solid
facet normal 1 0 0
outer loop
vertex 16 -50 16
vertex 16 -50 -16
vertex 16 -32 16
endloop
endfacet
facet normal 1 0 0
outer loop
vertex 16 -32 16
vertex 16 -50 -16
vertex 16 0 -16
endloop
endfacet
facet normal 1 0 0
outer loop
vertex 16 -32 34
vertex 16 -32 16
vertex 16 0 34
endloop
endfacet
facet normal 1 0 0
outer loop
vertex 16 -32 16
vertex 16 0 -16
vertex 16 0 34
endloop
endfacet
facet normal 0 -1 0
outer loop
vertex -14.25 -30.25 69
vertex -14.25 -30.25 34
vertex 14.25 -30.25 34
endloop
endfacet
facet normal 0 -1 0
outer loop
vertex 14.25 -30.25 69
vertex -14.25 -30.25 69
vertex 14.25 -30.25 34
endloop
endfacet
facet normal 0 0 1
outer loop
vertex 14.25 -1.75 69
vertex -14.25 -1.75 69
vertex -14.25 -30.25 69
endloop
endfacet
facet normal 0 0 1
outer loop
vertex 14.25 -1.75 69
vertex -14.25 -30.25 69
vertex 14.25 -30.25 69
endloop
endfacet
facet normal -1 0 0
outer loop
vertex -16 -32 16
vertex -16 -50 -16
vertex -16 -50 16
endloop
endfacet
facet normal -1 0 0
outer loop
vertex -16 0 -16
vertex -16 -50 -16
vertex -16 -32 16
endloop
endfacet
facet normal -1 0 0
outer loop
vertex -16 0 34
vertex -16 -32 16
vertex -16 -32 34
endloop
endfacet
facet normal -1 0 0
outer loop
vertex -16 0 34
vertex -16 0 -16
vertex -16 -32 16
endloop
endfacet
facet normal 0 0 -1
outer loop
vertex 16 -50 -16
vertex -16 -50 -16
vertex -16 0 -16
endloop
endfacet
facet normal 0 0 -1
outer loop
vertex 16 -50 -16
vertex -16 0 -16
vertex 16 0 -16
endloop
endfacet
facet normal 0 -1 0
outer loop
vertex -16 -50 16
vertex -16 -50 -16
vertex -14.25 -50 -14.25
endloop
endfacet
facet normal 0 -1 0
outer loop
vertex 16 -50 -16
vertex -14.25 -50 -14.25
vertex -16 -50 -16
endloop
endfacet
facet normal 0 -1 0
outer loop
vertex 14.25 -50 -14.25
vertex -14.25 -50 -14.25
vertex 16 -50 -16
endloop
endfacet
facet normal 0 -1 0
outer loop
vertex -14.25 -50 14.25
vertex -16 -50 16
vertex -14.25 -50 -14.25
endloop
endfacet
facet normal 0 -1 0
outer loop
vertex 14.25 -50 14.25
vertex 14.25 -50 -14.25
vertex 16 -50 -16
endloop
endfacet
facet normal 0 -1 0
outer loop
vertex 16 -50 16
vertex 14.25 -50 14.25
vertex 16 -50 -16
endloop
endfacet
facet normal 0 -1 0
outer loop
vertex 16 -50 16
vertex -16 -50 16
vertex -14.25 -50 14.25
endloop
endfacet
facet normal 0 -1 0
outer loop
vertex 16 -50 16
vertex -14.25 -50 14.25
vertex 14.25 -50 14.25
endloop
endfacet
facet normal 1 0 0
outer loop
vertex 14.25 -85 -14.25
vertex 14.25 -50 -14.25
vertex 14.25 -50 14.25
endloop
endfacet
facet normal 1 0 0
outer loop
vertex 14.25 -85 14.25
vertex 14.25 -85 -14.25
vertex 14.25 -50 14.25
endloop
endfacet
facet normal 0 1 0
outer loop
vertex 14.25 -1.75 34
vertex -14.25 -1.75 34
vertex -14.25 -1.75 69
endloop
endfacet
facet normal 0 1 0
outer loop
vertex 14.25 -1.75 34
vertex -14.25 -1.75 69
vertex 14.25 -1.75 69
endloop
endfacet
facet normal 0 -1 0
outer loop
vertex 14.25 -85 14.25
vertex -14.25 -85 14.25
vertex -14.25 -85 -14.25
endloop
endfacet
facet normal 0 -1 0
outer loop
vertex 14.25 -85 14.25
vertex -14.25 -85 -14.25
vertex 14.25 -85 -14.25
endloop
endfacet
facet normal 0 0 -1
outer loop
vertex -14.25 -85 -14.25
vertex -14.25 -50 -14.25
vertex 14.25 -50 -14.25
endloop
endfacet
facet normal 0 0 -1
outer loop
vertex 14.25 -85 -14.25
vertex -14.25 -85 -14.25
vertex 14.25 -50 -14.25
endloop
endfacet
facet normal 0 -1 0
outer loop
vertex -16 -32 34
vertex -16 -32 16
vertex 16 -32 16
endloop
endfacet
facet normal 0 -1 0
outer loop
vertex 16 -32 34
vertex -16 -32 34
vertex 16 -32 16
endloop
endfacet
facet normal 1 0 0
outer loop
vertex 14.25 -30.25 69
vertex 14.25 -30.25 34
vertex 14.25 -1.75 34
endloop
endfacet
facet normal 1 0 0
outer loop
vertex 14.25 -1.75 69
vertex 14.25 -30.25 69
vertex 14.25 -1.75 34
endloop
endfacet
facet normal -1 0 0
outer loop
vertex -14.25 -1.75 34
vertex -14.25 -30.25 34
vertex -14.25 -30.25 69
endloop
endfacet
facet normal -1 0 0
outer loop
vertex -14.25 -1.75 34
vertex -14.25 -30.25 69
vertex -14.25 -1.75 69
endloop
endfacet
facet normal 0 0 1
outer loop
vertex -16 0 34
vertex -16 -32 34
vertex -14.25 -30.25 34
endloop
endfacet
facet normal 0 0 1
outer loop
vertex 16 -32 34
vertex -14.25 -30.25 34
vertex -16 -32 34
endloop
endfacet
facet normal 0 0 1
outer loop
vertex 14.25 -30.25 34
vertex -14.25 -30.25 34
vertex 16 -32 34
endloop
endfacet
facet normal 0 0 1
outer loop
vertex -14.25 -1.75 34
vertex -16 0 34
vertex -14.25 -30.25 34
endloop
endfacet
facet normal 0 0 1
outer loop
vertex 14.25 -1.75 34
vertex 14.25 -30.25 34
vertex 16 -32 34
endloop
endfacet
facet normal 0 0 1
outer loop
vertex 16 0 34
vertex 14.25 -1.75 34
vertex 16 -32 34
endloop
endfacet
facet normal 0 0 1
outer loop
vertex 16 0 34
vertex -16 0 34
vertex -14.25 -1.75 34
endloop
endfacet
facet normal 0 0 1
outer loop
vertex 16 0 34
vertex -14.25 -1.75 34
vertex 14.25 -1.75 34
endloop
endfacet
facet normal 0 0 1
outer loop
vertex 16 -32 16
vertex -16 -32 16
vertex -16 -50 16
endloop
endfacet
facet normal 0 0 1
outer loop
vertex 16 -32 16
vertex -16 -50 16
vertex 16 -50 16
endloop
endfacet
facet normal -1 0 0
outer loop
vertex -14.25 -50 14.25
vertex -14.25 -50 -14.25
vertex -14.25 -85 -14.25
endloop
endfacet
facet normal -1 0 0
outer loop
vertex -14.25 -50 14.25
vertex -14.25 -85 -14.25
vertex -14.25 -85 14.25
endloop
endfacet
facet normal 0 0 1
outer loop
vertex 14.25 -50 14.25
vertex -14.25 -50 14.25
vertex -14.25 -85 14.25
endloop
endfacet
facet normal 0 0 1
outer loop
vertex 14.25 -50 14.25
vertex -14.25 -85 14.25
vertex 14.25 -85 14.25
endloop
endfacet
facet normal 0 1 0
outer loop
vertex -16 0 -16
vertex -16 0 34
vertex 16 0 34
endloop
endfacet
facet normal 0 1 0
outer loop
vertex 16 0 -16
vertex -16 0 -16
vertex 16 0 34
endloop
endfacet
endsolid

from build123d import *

# Parameters (mm, degrees)
F0_W     = 32
F0_H     = 32
F1_DEPTH = 32
F2_W     = 32
F2_H     = 32
F3_DEPTH = 18
F4_W     = 32
F4_H     = 32
F5_DEPTH = 18
F6_W     = 28.5
F6_H     = 28.5
F7_DEPTH = 35
F8_W     = 28.5
F8_H     = 28.5
F9_DEPTH = 35


with BuildPart() as f1:
    # F0 (on Front) → F1 (new body)
    with BuildSketch(Plane.XZ):
        Rectangle(F0_W, F0_H)
    extrude(amount=F1_DEPTH)

    # F2 (on face) → F3 (join)
    with BuildSketch(Plane.XY.offset(16)):
        with Locations((0, -16)):
            Rectangle(F2_W, F2_H)
    extrude(amount=F3_DEPTH)

    # F4 (on face) → F5 (join)
    with BuildSketch(Plane.XZ.offset(32)):
        Rectangle(F4_W, F4_H)
    extrude(amount=F5_DEPTH)

    # F6 (on face) → F7 (join)
    with BuildSketch(Plane.XY.offset(34)):
        with Locations((0, -16)):
            Rectangle(F6_W, F6_H)
    extrude(amount=F7_DEPTH)

    # F8 (on face) → F9 (join)
    with BuildSketch(Plane.XZ.offset(50)):
        Rectangle(F8_W, F8_H)
    extrude(amount=F9_DEPTH)


solid = f1.part
